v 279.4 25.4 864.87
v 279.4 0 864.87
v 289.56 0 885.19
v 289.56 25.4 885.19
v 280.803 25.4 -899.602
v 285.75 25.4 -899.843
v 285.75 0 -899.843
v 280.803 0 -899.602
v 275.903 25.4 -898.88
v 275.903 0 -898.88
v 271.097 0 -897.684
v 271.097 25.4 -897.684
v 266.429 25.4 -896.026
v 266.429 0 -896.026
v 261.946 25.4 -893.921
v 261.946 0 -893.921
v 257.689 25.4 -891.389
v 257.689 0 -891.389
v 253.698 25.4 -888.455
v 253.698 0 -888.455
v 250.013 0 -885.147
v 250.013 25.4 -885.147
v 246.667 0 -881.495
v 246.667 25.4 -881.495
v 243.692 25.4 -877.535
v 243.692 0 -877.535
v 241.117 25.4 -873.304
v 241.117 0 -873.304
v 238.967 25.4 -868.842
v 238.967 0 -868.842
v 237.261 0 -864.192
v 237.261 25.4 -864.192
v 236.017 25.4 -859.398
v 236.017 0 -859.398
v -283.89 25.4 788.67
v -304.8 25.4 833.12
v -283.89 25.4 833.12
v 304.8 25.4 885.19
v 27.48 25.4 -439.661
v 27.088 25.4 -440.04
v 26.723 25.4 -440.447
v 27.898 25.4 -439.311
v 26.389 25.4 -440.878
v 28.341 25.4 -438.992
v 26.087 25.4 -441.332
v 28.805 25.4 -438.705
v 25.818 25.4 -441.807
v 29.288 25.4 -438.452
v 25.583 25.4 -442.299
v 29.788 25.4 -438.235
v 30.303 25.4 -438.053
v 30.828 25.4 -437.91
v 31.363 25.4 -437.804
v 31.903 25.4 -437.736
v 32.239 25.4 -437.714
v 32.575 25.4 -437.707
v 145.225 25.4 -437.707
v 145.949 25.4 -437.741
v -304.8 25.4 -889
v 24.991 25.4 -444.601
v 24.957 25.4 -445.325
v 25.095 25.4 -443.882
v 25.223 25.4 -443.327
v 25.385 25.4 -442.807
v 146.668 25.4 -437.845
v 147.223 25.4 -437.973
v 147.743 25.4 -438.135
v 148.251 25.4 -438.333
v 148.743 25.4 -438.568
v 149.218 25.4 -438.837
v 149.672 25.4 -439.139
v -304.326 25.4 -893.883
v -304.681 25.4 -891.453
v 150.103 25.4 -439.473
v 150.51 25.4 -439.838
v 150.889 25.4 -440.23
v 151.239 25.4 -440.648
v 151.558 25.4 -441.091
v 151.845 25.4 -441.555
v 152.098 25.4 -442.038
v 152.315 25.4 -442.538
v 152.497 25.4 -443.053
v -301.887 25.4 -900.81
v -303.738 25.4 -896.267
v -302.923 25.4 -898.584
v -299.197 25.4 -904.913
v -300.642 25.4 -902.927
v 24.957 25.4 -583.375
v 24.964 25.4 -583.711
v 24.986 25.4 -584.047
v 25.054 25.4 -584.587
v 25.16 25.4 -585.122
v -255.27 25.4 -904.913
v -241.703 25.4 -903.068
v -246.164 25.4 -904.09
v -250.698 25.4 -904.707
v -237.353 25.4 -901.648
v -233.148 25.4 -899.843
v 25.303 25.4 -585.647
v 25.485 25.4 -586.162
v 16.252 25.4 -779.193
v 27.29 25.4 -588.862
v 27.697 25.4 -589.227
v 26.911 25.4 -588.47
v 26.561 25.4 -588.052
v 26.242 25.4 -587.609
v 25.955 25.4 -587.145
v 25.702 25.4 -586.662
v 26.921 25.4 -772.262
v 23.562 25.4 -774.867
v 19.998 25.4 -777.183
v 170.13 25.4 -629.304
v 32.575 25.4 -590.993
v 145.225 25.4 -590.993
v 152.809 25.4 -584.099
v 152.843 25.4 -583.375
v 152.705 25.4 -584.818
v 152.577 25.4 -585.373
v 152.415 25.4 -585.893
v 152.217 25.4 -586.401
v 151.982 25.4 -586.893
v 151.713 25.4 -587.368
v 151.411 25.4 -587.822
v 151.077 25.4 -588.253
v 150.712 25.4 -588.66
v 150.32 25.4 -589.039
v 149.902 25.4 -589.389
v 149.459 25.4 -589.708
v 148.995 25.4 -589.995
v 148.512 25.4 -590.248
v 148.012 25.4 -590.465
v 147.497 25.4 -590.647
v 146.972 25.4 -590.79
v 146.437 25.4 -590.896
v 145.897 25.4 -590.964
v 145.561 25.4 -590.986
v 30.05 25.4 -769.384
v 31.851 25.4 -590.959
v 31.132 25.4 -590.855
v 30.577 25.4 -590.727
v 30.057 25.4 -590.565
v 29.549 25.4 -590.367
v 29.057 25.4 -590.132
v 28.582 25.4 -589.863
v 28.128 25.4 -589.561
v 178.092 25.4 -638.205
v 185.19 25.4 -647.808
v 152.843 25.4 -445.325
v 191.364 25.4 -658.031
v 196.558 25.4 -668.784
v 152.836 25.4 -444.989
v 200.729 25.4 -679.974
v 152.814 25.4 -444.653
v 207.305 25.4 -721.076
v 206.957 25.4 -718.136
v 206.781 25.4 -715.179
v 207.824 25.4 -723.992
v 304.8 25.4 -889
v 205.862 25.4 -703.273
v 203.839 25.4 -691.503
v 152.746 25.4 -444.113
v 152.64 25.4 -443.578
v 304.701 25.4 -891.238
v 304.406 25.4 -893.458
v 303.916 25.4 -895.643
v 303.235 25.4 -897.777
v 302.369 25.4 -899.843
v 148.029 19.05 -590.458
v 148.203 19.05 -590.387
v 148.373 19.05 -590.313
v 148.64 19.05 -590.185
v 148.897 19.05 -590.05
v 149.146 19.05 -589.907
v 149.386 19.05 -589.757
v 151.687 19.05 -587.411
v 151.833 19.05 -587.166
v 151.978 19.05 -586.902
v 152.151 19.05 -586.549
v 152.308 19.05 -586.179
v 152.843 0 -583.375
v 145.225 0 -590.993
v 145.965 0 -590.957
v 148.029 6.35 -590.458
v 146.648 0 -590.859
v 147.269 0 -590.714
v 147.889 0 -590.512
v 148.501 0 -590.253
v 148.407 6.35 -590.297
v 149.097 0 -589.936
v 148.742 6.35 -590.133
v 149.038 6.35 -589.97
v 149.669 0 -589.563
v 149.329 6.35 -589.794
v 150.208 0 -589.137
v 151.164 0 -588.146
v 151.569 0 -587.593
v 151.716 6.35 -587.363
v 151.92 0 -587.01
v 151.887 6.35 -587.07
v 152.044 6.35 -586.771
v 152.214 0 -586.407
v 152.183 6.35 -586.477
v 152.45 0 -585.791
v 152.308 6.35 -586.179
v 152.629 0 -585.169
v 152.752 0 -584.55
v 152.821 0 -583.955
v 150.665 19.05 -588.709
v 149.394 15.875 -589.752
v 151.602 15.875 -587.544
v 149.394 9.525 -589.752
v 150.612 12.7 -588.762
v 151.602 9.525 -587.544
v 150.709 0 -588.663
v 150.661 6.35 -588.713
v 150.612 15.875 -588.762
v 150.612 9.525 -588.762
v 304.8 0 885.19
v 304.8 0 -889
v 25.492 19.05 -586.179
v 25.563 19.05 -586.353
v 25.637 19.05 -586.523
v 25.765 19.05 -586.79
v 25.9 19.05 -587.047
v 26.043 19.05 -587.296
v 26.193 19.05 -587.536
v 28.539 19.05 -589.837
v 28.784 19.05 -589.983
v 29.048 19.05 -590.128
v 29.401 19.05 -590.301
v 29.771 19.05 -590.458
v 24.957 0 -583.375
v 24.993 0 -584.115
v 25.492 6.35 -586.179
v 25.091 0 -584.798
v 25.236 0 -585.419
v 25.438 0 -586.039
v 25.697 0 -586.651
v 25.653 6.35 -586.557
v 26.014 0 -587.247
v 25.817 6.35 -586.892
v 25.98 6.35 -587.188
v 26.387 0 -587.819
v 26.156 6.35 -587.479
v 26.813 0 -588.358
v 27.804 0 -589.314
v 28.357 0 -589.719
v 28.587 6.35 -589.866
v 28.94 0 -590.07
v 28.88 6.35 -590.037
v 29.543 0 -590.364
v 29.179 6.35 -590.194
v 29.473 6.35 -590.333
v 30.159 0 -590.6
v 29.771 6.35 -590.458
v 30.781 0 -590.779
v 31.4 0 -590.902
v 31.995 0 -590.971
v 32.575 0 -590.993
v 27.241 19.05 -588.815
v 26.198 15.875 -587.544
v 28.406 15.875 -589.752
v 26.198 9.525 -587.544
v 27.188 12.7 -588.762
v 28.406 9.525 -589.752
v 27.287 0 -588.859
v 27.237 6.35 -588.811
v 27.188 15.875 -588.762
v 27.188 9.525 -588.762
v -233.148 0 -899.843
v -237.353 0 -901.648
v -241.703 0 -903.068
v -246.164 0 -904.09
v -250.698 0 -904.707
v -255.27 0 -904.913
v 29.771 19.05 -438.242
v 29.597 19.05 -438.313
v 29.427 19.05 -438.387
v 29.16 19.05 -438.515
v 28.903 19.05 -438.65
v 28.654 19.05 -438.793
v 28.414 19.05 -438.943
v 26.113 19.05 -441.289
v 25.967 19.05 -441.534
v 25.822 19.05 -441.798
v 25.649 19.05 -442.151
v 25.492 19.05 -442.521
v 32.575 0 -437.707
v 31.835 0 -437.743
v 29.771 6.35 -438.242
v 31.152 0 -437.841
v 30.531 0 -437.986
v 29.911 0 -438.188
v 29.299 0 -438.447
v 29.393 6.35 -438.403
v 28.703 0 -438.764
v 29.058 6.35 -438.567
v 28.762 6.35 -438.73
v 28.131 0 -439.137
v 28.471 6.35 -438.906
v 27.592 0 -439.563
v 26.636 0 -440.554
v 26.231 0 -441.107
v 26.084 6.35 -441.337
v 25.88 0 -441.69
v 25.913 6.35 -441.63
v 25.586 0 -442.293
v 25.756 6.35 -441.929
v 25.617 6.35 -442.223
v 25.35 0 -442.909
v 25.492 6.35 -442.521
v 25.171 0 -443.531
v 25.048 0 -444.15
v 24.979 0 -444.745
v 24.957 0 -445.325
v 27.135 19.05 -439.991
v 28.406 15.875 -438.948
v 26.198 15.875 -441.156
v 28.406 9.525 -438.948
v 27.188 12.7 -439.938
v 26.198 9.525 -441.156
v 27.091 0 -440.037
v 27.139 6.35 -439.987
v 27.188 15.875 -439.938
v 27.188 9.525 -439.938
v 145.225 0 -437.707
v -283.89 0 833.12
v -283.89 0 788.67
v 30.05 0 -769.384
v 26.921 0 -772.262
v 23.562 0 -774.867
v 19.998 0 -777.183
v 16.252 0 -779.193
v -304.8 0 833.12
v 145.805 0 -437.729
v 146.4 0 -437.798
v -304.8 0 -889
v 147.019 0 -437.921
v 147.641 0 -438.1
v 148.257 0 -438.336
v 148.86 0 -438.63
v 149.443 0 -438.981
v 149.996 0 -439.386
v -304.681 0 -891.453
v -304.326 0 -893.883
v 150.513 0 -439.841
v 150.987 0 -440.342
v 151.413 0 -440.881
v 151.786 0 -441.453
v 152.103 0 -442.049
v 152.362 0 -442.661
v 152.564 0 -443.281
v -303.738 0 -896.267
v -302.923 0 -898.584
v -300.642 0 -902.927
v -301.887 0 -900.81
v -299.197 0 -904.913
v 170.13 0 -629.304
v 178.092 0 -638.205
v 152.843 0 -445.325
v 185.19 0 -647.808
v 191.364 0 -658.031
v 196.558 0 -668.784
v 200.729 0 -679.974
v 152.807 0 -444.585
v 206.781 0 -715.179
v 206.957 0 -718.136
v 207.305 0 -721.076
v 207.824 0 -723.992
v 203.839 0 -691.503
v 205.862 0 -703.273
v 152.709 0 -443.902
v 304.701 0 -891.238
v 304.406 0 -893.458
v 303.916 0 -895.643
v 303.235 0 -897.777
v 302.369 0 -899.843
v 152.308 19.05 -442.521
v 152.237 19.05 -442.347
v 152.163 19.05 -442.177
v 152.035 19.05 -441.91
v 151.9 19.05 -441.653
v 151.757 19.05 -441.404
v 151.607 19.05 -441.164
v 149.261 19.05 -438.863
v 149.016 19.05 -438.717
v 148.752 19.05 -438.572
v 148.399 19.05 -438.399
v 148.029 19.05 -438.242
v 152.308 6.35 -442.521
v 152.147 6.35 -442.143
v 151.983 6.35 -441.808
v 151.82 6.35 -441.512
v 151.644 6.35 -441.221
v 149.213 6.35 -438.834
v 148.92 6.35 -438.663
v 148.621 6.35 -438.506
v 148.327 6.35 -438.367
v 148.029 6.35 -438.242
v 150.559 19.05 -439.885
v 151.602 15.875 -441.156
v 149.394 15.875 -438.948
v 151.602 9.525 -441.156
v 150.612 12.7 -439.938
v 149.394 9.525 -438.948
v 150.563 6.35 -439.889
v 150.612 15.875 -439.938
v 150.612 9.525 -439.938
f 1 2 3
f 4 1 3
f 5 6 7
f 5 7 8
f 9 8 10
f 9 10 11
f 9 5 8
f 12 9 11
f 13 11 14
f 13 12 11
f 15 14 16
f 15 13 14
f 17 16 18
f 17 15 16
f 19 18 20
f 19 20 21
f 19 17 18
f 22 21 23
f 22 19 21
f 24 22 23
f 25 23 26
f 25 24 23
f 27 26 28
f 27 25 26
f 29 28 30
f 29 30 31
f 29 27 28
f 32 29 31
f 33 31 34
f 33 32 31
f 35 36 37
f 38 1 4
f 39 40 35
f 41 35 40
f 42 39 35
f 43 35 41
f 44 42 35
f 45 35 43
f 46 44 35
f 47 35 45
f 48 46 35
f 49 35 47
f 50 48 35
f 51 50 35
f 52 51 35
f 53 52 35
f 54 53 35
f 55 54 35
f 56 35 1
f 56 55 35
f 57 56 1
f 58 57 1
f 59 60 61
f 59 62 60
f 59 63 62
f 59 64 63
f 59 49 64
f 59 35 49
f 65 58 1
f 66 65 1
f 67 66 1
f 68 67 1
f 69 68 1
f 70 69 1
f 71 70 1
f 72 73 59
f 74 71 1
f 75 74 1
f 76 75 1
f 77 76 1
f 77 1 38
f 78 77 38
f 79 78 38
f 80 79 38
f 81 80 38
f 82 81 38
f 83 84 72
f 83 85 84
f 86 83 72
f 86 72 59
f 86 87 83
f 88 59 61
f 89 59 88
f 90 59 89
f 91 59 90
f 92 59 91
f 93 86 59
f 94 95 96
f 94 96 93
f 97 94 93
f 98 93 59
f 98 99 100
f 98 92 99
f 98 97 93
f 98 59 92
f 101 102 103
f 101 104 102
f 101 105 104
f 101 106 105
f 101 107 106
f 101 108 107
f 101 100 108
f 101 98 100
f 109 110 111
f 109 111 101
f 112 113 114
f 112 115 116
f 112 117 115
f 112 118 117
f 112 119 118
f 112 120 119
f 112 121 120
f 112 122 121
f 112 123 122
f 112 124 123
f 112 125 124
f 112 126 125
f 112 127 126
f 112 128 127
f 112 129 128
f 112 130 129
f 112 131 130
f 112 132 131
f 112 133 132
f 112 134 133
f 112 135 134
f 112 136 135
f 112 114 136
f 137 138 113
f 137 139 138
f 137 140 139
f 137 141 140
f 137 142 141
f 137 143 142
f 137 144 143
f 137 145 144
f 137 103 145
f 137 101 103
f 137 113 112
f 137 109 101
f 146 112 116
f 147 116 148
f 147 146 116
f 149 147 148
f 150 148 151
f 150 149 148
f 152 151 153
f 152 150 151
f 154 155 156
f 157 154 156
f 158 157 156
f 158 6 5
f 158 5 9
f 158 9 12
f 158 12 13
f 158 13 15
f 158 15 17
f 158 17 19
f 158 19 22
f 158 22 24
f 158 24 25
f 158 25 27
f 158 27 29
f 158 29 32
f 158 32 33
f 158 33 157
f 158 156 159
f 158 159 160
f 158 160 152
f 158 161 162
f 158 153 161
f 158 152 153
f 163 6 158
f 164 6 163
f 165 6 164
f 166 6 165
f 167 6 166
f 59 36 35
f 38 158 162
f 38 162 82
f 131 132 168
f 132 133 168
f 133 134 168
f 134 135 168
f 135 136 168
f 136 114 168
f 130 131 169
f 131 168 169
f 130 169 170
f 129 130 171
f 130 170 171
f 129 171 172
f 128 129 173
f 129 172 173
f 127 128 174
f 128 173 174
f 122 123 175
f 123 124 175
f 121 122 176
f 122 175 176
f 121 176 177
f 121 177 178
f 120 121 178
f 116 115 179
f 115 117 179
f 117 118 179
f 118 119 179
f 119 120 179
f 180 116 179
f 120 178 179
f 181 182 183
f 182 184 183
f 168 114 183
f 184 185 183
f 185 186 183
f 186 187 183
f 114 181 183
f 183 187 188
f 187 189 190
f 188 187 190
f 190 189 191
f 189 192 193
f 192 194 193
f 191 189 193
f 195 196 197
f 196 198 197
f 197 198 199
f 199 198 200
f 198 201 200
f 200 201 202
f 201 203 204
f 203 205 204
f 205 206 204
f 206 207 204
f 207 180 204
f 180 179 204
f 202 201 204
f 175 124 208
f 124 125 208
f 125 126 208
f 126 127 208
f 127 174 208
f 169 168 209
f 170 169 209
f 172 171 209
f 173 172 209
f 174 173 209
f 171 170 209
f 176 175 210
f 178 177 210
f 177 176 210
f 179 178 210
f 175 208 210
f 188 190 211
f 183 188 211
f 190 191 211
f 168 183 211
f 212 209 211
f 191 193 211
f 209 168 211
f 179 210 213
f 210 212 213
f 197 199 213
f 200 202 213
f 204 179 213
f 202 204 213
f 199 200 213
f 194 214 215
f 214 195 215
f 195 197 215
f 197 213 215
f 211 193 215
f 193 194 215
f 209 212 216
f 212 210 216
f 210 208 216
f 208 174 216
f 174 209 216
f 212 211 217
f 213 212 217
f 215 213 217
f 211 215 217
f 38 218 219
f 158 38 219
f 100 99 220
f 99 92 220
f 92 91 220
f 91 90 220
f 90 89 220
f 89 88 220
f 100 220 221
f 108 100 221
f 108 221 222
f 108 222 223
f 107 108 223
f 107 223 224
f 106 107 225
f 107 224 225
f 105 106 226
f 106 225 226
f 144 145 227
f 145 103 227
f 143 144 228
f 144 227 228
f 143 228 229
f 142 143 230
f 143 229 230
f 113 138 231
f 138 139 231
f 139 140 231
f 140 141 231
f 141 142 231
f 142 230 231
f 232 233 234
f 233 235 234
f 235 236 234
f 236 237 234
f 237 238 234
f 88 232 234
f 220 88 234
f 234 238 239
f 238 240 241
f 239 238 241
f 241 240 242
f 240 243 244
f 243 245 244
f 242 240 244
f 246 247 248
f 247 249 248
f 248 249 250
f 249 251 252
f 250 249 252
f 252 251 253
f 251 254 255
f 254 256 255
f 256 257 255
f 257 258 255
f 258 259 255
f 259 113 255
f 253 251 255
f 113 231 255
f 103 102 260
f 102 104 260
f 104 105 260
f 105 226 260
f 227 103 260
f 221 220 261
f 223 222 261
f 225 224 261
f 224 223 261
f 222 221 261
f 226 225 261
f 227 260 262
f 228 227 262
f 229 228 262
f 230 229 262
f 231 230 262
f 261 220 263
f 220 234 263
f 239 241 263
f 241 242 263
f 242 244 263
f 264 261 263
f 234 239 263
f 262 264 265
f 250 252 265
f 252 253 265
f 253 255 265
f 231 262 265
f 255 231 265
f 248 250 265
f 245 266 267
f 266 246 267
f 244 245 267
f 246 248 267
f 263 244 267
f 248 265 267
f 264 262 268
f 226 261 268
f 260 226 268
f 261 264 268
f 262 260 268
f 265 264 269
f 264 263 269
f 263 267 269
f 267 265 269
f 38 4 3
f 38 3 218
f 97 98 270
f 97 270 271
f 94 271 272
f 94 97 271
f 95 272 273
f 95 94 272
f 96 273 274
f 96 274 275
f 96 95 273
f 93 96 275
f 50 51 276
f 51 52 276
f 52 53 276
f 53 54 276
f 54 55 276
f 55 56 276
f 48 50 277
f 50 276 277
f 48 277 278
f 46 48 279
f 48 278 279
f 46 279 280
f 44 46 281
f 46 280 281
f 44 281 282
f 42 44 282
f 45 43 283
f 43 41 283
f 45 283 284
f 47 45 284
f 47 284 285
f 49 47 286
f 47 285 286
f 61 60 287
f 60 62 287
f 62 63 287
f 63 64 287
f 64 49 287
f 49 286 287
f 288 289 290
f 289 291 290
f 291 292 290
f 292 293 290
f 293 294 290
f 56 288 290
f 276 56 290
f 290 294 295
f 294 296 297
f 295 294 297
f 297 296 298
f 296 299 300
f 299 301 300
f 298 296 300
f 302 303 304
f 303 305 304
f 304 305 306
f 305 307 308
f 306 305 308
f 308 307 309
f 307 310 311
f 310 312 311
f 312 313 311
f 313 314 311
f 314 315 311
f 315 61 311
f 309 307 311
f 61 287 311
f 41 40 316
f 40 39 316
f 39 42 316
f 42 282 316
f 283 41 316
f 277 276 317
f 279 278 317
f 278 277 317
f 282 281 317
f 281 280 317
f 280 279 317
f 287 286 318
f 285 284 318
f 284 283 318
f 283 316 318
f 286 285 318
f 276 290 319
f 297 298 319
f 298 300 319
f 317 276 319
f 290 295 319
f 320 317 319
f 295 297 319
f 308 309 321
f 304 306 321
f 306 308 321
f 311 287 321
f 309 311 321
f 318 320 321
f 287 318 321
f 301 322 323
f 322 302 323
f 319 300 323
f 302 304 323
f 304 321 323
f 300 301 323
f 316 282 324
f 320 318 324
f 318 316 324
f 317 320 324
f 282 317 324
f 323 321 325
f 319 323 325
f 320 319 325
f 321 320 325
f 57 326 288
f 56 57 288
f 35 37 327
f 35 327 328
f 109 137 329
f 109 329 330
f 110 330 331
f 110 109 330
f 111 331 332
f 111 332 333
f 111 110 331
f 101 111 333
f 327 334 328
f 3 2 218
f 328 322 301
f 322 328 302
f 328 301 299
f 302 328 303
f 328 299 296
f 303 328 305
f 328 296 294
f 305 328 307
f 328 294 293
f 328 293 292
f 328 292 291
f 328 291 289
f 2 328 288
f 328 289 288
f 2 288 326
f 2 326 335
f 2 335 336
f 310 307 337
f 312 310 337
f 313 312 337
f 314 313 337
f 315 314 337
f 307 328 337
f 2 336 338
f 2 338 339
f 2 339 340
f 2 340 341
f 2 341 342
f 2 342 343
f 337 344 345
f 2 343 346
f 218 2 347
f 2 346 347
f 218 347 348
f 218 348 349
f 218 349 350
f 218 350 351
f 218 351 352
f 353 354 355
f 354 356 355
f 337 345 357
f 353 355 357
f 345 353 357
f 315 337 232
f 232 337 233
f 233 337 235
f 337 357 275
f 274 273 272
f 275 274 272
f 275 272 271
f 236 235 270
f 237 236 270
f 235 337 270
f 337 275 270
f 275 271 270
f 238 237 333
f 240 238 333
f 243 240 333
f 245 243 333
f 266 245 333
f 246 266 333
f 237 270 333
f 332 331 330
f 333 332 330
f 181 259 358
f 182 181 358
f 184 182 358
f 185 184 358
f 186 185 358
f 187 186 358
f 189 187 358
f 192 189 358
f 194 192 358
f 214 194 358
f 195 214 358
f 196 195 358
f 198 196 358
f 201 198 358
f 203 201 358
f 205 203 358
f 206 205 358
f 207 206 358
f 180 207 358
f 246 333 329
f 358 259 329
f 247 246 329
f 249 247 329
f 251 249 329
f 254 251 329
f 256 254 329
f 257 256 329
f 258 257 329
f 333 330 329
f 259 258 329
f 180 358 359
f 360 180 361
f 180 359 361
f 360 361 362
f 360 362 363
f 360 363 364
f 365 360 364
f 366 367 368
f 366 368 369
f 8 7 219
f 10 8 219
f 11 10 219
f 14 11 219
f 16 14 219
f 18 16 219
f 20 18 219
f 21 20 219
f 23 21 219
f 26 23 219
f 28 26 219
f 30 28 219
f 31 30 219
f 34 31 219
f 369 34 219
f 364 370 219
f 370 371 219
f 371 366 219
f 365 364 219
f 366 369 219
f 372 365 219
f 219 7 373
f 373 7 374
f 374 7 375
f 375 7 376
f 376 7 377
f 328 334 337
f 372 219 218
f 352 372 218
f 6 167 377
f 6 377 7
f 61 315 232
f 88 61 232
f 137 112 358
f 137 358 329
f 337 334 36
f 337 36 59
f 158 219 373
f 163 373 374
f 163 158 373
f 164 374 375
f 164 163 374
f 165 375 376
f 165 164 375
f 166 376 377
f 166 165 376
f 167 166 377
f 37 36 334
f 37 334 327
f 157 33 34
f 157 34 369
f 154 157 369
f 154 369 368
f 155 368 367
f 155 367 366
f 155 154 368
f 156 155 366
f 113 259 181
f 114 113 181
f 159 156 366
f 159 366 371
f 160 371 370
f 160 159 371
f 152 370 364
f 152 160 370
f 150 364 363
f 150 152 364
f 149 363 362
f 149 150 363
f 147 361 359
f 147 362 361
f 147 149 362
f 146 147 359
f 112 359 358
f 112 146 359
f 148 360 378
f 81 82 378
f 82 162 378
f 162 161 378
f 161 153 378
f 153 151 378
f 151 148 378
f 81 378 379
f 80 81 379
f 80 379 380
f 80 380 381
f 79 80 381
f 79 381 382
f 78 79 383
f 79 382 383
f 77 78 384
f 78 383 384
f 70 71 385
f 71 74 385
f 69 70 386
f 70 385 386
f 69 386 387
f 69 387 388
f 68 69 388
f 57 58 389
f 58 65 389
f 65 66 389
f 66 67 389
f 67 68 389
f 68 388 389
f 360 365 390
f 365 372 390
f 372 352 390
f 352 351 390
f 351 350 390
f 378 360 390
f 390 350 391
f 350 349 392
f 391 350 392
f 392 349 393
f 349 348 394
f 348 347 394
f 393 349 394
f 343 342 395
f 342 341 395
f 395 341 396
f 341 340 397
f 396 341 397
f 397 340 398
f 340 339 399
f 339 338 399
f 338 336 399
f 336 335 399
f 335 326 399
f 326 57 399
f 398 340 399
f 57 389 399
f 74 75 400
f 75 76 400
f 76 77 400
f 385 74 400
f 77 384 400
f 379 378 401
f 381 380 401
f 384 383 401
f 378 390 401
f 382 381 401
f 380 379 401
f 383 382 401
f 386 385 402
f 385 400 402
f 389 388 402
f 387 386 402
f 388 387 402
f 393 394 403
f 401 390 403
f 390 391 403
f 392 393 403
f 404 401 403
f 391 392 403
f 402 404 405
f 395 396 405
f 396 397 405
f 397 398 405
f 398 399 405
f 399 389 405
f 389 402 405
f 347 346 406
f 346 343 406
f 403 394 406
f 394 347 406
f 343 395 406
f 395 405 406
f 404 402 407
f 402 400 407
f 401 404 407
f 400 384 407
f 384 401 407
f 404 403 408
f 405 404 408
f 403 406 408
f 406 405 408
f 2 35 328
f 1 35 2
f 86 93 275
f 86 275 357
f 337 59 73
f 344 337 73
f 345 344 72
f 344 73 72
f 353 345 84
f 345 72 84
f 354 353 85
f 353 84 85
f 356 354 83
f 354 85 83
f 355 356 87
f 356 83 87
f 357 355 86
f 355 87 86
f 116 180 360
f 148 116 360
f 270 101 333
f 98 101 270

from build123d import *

# Parameters (mm, degrees)
SKETCH1_W           = 609.6
SKETCH1_H           = 1828.8
BOSS_EXTRUDE1_DEPTH = 25.4
FILLET1_R           = 25.4
CUT_EXTRUDE2_DEPTH  = 965.196847122
CUT_EXTRUDE3_DEPTH  = 965.196847122
CUT_EXTRUDE4_DEPTH  = 956.204611857


with BuildPart() as part:
    # Sketch1 → Boss-Extrude1 (new body)
    with BuildSketch(Plane(origin=(0, 0, 0), x_dir=(1, 0, 0), z_dir=(0, 1, 0))):
        Rectangle(SKETCH1_W, SKETCH1_H)
    extrude(amount=BOSS_EXTRUDE1_DEPTH)

    # Fillet1
    fillet1_edges = [part.edges().sort_by_distance(p)[0] for p in [
        (-304.8, 12.7, -914.4),
        (304.8, 12.7, -914.4),
        (304.8, 12.7, 914.4),
        (-304.8, 12.7, 914.4),
    ]]
    fillet(fillet1_edges, radius=FILLET1_R)

    # Sketch3 → Cut-Extrude2 (cut, through all)
    with BuildSketch(Plane(origin=(0, 25.4, 0), x_dir=(1, 0, 0), z_dir=(0, 1, 0))):
        with BuildLine():
            Line((16.251587569, 779.193092163), (-233.147514188, 899.843092163))
            ThreePointArc((-233.147514188, 899.843092163), (-243.921993823, 903.629350189), (-255.27, 904.913062406))
            Line((-255.27, 904.913062406), (-323.85, 904.913062406))
            Line((-323.85, 904.913062406), (-323.85, 931.593092163))
            Line((-323.85, 931.593092163), (311.15, 931.593092163))
            Line((311.15, 931.593092163), (311.15, 899.843092163))
            Line((311.15, 899.843092163), (285.75, 899.843092163))
            ThreePointArc((285.75, 899.843092163), (253.698373918, 888.455441312), (236.016540238, 859.397945134))
            Line((236.016540238, 859.397945134), (207.824095772, 723.992082179))
            ThreePointArc((207.824095772, 723.992082179), (207.109723344, 719.608512763), (206.78096626, 715.179299789))
            ThreePointArc((206.78096626, 715.179299789), (196.558100486, 668.783623502), (170.129901322, 629.30431181))
            Line((170.129901322, 629.30431181), (30.050126241, 769.384086891))
            ThreePointArc((30.050126241, 769.384086891), (23.562355365, 774.867453261), (16.251587569, 779.193092163))
        make_face()
    extrude(amount=-CUT_EXTRUDE2_DEPTH, mode=Mode.SUBTRACT)

    # Sketch4 → Cut-Extrude3 (cut, through all)
    with BuildSketch(Plane(origin=(0, 25.4, 0), x_dir=(1, 0, 0), z_dir=(0, 1, 0))):
        Polygon((-327.069996122, -833.12), (-283.889996122, -833.12), (-283.889996122, -788.67), (279.4, -864.87), (289.56, -885.19), (330.2, -885.19), (330.2, -946.15), (-327.069996122, -946.15), align=None)
    extrude(amount=-CUT_EXTRUDE3_DEPTH, mode=Mode.SUBTRACT)

    # Sketch5 → Cut-Extrude4 (cut, through all)
    with BuildSketch(Plane.XZ):
        with BuildLine():
            Line((152.843358649, -583.374519212), (152.843358649, -445.325480788))
            add(Edge.make_bspline(
                [(152.843358649, -445.325480788), (152.843358649, -437.706641351), (145.224519212, -437.706641351)],
                knots=[2.356346783, 2.356346783, 2.356346783, 3.926838524, 3.926838524, 3.926838524], degree=2, weights=[1, 0.707214461, 1]))
            Line((145.224519212, -437.706641351), (32.575480788, -437.706641351))
            add(Edge.make_bspline(
                [(32.575480788, -437.706641351), (24.956641351, -437.706641351), (24.956641351, -445.325480788)],
                knots=[2.356346783, 2.356346783, 2.356346783, 3.926838524, 3.926838524, 3.926838524], degree=2, weights=[1, 0.707214461, 1]))
            Line((24.956641351, -445.325480788), (24.956641351, -583.374519212))
            add(Edge.make_bspline(
                [(24.956641351, -583.374519212), (24.956641351, -590.993358649), (32.575480788, -590.993358649)],
                knots=[2.356346783, 2.356346783, 2.356346783, 3.926838524, 3.926838524, 3.926838524], degree=2, weights=[1, 0.707214461, 1]))
            Line((32.575480788, -590.993358649), (145.224519212, -590.993358649))
            add(Edge.make_bspline(
                [(145.224519212, -590.993358649), (152.843358649, -590.993358649), (152.843358649, -583.374519212)],
                knots=[2.356346783, 2.356346783, 2.356346783, 3.926838524, 3.926838524, 3.926838524], degree=2, weights=[1, 0.707214461, 1]))
        make_face()
    extrude(amount=-CUT_EXTRUDE4_DEPTH, mode=Mode.SUBTRACT)


solid = part.part
